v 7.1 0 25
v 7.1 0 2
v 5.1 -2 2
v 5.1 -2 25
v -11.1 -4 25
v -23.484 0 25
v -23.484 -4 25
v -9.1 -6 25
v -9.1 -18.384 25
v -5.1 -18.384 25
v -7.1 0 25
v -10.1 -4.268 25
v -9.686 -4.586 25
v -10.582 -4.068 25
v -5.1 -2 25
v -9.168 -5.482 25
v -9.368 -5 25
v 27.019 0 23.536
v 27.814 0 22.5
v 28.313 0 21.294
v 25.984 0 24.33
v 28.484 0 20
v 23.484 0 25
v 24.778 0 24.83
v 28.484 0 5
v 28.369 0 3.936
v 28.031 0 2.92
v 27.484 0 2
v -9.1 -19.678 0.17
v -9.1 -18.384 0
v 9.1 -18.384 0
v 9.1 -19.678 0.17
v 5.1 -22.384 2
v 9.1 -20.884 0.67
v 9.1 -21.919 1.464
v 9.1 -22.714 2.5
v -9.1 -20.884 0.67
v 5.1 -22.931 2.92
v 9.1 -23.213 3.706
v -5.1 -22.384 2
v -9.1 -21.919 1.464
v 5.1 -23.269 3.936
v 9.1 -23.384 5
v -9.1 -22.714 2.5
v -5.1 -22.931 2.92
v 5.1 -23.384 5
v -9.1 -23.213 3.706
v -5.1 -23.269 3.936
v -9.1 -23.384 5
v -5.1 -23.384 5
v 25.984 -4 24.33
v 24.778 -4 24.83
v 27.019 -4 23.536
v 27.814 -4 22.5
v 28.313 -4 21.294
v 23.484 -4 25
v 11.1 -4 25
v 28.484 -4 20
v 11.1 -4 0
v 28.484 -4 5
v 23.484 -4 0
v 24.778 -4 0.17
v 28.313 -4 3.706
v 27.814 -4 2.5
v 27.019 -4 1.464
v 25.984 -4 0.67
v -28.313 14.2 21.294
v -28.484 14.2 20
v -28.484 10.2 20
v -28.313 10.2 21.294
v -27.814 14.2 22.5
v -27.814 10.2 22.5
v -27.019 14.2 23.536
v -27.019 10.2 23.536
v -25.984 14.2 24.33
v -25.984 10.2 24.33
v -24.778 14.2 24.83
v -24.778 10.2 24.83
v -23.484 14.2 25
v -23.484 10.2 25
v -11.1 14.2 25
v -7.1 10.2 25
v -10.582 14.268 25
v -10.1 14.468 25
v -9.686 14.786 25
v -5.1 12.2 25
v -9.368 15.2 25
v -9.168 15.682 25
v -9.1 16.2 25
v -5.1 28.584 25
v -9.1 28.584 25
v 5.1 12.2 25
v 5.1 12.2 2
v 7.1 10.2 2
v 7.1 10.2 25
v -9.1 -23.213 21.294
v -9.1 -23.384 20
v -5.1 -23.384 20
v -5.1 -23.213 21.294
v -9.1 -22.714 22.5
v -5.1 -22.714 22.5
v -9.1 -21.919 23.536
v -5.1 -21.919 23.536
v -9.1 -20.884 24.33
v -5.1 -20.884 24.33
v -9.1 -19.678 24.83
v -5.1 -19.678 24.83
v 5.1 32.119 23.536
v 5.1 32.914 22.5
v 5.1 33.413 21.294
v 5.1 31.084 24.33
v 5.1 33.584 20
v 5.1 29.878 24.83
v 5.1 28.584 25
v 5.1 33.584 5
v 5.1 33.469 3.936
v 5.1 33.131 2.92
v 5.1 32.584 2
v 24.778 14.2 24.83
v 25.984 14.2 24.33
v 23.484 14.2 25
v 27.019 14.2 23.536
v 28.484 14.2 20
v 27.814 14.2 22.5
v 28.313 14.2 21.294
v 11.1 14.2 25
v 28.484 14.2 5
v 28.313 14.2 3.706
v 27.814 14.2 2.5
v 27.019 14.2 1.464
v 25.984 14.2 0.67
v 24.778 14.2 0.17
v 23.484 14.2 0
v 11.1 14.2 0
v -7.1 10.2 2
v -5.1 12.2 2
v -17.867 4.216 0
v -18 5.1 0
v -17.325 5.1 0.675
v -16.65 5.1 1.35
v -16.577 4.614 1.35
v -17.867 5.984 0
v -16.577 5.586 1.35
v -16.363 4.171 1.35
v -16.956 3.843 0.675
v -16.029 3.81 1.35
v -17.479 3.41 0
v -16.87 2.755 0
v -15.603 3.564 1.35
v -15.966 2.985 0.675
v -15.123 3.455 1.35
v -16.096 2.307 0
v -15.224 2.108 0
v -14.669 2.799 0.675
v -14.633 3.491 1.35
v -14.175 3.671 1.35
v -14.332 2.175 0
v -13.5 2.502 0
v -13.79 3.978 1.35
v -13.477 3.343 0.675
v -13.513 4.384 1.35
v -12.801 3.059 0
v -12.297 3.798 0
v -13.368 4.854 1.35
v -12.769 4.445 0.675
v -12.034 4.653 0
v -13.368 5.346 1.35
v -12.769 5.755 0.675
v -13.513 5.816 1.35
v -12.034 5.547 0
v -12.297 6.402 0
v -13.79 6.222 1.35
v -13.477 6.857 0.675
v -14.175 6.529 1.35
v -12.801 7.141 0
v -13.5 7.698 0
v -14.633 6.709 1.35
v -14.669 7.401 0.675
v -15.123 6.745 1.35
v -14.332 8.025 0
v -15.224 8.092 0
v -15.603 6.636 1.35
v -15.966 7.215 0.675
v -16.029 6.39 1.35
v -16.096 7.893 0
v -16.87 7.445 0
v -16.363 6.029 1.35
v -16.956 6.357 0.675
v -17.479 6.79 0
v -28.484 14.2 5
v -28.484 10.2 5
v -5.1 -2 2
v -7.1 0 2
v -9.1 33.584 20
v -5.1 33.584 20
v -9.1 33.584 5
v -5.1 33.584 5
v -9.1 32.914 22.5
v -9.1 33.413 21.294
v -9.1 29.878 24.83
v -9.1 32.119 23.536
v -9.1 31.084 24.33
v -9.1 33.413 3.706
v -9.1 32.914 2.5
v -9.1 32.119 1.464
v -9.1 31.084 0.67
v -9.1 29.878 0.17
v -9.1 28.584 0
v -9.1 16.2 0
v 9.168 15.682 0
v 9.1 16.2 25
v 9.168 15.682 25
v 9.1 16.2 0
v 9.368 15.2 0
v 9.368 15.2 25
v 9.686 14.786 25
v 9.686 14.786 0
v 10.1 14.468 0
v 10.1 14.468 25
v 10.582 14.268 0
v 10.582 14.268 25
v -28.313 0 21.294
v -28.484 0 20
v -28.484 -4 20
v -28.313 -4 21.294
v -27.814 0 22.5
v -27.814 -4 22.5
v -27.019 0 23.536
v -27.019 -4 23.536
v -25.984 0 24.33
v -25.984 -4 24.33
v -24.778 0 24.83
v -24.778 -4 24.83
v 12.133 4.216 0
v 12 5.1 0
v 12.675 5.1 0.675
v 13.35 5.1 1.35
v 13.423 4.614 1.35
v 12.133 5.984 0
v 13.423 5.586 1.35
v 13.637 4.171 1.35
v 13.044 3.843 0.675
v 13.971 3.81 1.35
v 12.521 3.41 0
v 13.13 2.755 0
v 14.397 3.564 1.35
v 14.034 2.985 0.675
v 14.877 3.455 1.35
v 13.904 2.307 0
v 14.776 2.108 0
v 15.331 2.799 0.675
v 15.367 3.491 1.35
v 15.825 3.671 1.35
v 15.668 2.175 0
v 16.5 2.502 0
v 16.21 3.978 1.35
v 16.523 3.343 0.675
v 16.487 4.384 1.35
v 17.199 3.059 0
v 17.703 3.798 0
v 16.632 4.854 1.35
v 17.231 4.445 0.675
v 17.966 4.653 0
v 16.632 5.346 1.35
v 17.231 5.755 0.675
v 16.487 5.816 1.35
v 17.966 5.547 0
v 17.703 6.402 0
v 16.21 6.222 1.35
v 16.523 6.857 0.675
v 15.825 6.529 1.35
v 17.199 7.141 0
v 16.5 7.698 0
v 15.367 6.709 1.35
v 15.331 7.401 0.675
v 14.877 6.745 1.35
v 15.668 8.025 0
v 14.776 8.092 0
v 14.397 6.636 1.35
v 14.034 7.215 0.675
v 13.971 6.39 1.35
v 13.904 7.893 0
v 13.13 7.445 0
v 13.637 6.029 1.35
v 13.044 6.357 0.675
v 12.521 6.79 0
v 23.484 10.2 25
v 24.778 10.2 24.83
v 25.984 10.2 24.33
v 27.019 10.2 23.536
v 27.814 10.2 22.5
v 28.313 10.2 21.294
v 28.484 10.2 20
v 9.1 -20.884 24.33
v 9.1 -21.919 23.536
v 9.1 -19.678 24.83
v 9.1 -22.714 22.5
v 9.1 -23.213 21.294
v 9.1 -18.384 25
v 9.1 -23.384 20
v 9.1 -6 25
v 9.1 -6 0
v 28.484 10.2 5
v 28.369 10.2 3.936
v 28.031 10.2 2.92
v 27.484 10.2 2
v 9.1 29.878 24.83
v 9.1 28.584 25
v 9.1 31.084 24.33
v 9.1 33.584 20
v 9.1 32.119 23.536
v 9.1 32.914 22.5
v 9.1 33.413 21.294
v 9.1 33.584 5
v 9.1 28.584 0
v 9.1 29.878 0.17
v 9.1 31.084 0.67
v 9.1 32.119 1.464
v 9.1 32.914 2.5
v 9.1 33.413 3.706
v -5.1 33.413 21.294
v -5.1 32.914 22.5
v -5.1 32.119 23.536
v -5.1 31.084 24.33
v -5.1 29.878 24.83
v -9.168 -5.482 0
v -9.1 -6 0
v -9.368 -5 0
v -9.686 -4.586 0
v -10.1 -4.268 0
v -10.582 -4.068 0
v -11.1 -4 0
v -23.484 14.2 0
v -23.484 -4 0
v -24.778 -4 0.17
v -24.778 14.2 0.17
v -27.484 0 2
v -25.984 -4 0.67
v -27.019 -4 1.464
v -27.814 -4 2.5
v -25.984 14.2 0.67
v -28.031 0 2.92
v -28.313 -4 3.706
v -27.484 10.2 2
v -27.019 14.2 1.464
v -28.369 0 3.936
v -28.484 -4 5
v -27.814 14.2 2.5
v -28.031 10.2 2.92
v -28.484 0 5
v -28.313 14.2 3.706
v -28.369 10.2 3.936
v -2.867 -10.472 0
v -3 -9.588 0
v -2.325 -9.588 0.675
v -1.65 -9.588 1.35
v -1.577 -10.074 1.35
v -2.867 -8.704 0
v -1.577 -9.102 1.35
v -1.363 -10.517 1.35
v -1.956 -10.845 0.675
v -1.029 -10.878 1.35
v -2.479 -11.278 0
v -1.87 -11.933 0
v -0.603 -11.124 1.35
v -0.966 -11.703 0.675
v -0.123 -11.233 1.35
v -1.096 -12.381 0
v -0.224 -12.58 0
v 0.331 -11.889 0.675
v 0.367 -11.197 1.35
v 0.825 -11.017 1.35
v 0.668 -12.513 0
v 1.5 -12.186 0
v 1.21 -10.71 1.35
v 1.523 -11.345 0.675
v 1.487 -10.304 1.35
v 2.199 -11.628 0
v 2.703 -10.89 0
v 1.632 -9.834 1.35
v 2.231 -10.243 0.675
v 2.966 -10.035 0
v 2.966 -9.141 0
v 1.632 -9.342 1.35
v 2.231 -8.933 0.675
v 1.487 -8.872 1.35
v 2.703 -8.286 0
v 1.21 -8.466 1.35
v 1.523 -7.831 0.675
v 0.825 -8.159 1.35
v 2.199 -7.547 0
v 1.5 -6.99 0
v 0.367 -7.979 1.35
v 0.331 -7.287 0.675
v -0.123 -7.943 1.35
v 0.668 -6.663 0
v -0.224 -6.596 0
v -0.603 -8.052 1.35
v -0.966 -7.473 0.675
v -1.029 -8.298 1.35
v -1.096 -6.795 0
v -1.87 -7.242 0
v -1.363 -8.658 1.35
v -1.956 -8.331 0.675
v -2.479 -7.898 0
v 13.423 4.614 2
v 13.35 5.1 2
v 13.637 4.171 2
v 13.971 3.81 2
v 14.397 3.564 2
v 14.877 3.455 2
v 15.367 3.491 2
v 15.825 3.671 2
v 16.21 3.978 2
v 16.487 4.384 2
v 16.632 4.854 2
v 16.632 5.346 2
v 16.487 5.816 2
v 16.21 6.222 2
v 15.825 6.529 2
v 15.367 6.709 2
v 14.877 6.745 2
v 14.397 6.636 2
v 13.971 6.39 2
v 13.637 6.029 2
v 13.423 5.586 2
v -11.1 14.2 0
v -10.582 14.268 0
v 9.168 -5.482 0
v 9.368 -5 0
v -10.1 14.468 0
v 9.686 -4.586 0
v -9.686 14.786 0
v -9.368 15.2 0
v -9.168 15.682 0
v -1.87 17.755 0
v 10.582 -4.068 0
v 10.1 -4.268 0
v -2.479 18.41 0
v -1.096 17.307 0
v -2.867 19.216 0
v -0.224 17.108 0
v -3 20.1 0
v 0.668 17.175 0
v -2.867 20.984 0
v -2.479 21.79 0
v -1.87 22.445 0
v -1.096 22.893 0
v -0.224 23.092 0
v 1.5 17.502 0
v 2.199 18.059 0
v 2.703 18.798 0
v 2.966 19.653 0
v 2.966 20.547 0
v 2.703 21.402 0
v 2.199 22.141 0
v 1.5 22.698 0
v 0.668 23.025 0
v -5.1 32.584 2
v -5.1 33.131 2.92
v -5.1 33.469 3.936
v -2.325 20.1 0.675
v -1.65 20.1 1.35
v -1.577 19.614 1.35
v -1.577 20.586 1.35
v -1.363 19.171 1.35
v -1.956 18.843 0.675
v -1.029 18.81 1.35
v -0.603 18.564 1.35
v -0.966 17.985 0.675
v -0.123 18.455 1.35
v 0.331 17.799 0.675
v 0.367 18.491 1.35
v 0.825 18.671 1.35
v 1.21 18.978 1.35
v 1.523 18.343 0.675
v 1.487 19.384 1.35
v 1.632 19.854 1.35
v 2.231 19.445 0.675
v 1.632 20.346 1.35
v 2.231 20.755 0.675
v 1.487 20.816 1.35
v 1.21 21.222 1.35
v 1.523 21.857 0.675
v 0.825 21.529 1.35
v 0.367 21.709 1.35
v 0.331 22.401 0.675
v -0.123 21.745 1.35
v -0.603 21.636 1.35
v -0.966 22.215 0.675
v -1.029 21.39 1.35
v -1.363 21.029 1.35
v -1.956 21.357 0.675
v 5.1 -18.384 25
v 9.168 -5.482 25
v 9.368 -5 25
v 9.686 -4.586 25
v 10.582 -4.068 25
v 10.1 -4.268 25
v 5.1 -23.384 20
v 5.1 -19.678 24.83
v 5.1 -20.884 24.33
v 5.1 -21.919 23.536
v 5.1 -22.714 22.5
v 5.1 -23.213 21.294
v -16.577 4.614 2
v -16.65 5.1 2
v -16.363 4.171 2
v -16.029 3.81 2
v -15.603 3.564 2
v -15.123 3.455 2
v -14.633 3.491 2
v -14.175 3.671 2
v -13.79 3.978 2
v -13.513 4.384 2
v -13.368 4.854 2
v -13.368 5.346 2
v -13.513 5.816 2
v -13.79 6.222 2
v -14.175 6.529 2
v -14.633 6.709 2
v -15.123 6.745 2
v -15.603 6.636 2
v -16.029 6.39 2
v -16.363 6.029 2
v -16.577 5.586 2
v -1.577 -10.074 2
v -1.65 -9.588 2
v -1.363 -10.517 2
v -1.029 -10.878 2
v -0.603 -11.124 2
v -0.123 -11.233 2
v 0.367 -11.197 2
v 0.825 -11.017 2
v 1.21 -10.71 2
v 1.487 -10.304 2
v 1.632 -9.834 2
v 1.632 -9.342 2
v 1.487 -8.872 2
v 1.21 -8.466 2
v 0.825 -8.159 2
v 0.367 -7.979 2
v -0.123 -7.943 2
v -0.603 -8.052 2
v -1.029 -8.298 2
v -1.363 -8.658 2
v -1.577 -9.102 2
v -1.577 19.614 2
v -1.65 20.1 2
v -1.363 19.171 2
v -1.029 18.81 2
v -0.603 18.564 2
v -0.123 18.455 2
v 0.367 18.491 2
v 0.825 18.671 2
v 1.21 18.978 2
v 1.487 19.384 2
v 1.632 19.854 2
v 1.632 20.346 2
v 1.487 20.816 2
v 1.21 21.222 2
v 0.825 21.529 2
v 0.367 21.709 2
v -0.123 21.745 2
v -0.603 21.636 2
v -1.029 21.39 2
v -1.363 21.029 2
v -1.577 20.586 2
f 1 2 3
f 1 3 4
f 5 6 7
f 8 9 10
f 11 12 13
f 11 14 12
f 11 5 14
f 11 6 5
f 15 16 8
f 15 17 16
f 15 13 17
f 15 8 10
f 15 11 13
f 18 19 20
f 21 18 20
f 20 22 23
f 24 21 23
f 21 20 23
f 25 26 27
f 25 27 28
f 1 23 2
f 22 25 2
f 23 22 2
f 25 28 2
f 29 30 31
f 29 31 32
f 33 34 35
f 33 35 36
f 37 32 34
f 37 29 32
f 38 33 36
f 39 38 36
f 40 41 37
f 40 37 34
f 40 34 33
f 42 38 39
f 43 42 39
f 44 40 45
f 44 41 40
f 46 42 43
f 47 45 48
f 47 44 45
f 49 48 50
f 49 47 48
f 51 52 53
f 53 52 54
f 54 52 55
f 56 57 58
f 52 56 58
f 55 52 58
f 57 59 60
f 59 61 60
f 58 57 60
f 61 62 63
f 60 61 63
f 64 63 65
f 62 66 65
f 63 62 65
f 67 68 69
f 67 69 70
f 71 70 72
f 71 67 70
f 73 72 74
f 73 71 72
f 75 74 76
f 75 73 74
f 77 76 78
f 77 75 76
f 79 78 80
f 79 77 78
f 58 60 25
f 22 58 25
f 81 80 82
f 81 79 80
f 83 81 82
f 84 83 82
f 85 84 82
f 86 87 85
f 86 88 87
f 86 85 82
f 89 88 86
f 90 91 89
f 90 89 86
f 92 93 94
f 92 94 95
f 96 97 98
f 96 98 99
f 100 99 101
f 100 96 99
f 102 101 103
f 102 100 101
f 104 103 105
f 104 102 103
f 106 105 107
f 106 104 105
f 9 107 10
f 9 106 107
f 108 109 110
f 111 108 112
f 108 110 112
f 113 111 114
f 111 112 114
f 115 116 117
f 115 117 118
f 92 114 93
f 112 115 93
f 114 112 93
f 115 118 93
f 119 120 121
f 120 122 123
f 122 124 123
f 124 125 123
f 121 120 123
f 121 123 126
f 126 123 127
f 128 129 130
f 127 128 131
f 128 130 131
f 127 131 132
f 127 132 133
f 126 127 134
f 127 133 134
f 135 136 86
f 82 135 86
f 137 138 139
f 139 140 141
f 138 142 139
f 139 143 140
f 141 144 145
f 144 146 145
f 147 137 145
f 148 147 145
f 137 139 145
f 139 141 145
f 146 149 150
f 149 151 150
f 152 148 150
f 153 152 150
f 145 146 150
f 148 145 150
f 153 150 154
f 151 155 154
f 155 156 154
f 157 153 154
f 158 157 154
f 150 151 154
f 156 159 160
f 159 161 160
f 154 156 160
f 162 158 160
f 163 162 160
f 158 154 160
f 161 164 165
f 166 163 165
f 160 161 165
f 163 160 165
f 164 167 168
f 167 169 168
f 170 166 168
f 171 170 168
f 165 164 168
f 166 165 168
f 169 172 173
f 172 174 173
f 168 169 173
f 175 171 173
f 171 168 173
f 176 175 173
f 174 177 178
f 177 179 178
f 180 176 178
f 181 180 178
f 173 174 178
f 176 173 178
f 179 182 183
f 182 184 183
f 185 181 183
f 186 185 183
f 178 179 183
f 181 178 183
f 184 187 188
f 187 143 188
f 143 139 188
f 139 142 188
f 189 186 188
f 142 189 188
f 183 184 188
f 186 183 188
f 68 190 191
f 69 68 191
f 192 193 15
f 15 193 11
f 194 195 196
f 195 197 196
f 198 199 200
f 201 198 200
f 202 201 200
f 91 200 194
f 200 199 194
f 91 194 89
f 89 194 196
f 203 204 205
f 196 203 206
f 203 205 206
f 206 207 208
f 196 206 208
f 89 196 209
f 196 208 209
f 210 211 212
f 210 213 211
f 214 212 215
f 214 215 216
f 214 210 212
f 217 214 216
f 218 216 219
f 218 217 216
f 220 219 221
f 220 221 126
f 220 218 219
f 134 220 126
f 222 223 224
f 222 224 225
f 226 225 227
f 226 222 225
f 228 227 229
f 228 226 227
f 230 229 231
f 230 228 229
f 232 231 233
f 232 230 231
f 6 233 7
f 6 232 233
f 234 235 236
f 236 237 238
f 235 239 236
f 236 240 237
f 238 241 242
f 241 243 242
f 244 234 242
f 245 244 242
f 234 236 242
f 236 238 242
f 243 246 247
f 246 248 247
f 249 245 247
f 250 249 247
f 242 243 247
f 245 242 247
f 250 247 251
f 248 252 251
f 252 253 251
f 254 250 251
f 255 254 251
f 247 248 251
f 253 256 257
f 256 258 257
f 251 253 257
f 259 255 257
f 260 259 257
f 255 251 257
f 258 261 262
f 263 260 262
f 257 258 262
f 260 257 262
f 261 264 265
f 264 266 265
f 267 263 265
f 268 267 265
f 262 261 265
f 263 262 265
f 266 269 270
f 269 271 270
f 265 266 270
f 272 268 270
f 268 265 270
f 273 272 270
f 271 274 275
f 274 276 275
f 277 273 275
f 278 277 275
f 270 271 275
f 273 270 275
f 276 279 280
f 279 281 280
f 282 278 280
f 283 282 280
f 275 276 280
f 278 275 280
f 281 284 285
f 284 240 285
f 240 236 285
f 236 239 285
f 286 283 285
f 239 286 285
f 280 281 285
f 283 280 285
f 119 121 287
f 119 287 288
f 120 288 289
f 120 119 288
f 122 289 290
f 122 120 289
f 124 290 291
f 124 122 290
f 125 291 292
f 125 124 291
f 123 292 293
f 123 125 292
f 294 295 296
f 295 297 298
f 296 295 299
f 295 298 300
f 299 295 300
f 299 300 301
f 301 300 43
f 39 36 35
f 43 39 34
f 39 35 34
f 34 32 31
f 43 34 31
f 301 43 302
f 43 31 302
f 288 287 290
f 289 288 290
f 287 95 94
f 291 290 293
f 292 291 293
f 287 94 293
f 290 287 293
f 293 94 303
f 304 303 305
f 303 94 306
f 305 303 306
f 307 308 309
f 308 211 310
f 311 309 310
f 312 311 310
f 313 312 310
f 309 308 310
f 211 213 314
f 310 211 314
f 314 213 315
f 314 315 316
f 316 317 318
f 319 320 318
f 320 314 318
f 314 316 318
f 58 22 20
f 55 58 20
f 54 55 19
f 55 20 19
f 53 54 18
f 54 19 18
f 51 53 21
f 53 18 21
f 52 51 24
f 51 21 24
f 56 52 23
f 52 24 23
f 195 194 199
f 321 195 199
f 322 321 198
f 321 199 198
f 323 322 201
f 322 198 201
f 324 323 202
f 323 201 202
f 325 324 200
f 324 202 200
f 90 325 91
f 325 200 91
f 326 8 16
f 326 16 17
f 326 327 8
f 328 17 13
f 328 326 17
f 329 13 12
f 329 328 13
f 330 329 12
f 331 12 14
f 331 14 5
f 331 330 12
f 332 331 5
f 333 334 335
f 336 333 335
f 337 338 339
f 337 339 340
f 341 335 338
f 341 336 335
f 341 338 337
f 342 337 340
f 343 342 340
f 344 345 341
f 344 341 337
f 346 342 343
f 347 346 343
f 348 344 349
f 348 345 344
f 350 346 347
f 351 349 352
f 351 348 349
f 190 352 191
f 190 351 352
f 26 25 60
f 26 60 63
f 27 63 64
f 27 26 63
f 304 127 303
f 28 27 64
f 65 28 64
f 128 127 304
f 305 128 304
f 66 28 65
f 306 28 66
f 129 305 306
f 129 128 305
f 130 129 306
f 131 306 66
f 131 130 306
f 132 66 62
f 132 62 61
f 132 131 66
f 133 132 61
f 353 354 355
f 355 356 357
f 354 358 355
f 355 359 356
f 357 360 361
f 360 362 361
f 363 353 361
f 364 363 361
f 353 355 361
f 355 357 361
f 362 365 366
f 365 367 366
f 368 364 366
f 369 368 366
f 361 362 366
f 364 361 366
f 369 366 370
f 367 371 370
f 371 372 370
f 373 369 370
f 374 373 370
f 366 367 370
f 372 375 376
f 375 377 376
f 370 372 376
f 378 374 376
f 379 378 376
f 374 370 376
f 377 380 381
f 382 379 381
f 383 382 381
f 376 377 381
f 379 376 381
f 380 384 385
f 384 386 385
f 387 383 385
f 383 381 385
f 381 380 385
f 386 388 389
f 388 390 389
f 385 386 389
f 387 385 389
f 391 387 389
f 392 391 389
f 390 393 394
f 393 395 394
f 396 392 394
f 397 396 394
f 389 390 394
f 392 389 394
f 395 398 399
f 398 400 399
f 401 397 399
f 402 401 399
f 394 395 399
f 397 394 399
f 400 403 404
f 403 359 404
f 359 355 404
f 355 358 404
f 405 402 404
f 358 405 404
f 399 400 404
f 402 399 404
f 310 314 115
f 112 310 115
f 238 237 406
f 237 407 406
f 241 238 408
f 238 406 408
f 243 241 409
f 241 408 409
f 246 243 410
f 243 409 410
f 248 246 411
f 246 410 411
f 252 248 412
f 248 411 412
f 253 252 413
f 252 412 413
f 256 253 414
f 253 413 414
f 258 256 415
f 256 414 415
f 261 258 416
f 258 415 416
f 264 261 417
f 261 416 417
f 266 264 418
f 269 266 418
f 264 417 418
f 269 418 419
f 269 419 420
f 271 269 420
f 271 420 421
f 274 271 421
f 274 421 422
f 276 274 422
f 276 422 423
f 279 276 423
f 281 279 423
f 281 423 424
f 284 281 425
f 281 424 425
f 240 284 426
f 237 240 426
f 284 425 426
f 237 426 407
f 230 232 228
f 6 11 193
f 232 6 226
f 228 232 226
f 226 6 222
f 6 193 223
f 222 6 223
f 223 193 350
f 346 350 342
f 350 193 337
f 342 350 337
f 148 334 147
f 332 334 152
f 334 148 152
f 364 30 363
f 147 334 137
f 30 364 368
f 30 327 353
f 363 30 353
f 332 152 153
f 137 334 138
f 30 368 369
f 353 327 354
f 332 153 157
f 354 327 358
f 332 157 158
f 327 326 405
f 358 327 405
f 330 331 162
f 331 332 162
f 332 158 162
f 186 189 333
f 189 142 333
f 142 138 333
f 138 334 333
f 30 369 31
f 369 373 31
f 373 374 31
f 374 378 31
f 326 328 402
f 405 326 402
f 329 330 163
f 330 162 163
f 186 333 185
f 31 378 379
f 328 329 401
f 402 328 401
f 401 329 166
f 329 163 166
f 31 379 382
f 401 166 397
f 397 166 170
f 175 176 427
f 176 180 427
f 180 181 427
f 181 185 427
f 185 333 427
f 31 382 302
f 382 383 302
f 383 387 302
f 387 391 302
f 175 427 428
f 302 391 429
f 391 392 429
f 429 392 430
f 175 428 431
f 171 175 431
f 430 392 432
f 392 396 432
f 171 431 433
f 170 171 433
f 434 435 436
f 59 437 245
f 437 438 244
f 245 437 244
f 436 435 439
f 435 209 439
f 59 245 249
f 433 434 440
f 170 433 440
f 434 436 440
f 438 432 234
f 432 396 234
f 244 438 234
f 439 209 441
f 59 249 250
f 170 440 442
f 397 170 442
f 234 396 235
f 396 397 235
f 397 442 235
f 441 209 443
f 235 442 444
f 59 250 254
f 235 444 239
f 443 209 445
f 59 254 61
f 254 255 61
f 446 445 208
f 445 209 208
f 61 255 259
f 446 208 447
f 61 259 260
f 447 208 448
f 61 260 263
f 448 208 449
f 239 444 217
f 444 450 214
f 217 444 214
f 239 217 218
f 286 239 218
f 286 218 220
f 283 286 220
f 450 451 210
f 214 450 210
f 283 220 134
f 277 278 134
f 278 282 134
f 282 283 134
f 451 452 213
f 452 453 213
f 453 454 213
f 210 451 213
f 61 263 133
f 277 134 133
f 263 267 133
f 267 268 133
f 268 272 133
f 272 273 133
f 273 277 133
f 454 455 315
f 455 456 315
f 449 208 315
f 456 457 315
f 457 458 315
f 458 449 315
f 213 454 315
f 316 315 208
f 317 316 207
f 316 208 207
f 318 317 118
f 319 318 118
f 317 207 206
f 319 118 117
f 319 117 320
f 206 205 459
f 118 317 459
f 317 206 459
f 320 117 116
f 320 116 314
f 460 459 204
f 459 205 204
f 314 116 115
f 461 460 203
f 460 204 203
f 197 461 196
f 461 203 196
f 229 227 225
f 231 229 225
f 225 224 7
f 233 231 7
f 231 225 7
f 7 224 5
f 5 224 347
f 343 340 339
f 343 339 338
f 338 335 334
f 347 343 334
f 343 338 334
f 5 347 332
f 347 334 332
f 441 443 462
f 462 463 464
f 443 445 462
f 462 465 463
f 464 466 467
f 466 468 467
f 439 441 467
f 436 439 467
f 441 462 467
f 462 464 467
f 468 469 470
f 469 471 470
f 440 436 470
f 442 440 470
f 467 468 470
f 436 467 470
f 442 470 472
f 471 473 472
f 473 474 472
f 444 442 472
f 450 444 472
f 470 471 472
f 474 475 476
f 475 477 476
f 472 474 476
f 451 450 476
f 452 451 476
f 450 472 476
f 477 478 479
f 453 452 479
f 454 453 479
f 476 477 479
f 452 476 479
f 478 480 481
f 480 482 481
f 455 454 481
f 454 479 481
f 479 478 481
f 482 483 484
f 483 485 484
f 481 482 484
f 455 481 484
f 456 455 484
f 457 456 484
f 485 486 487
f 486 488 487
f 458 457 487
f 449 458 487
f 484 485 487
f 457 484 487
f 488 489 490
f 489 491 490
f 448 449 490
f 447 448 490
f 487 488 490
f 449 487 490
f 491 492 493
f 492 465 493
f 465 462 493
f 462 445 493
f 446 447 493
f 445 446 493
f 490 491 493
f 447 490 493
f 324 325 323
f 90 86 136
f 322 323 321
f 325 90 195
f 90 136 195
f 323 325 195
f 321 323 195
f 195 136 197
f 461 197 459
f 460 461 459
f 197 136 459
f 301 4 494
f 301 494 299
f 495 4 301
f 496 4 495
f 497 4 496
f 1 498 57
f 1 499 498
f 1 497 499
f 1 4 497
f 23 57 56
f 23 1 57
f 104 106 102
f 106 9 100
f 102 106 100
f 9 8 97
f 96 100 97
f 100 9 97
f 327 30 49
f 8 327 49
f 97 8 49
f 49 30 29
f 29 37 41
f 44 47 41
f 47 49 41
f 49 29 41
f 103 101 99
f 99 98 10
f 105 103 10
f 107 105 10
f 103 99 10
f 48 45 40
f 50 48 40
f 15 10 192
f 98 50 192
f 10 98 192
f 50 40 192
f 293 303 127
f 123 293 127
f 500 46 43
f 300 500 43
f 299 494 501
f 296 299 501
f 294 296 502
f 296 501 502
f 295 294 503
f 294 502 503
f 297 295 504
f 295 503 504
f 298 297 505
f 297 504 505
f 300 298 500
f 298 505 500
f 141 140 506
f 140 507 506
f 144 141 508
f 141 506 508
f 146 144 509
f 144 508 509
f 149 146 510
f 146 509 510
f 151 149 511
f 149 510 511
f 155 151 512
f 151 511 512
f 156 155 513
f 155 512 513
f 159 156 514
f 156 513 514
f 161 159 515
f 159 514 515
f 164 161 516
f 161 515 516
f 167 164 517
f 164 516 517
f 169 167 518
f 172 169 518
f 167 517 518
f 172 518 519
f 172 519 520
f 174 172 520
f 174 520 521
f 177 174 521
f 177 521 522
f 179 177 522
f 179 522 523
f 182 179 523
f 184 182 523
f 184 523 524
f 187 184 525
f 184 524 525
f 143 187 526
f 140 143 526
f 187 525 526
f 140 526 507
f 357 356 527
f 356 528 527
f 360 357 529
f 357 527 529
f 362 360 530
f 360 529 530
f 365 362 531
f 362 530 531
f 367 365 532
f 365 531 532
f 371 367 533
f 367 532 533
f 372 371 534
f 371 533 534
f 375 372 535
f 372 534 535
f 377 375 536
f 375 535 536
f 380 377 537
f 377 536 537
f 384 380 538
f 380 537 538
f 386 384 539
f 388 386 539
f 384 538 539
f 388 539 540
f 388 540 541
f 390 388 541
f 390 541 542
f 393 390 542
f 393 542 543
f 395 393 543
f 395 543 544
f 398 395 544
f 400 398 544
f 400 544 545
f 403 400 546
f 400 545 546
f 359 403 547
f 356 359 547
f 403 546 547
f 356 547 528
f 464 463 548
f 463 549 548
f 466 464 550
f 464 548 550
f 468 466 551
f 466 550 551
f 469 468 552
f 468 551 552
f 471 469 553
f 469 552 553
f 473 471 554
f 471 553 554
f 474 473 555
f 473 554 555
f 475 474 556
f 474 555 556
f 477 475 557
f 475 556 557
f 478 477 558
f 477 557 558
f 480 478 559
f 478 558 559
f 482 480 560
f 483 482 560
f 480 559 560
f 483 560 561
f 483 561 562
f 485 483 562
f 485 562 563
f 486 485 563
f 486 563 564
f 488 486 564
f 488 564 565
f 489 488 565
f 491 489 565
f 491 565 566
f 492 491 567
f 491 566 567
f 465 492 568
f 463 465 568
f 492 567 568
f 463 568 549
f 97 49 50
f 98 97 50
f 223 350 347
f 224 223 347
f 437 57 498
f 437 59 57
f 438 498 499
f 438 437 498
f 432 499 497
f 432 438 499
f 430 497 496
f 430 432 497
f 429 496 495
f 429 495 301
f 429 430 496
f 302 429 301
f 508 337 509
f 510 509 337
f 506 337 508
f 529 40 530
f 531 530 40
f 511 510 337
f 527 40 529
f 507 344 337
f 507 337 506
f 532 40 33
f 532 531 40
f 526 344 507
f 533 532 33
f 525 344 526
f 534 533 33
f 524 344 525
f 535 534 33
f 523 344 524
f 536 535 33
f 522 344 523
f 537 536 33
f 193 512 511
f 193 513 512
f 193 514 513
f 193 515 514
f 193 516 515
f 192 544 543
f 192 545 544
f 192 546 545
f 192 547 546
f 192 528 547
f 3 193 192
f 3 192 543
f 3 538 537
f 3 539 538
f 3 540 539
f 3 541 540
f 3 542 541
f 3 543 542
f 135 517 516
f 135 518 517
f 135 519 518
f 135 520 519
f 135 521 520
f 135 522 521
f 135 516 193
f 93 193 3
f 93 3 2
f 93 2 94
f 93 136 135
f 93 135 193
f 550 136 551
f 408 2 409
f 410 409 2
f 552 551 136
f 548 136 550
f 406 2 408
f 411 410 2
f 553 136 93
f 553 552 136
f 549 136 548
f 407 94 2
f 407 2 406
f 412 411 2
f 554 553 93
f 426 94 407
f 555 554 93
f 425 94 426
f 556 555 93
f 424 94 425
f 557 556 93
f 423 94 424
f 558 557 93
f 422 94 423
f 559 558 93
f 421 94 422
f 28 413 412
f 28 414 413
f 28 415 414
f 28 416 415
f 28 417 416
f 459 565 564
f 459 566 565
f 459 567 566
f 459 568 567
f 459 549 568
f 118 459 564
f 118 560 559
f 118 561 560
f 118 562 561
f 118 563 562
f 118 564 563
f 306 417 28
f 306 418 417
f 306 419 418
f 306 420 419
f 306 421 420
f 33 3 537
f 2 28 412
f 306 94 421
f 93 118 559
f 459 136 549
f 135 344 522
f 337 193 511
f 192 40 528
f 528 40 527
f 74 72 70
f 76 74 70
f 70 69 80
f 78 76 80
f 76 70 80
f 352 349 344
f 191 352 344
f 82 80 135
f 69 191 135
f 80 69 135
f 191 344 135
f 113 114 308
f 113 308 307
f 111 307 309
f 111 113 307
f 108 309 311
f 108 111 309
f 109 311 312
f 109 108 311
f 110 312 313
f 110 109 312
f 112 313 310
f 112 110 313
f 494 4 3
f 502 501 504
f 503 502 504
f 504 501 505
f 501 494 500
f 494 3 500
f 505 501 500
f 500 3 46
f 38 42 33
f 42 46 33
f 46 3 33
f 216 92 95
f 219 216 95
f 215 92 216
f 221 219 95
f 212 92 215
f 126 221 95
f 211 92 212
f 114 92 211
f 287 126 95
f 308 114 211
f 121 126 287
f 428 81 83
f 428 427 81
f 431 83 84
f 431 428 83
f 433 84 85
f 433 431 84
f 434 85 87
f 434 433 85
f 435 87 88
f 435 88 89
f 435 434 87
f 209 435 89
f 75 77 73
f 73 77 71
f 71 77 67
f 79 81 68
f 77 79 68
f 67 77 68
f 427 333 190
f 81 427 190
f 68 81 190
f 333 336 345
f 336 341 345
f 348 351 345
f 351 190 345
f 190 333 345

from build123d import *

# Parameters (mm, degrees)
F1_DEPTH       = 2
F2_DEPTH       = 25
F3_R           = 2
F4_T1_DEPTH    = 4
F4_T3_DEPTH    = 4
F4_T5_DEPTH    = 4
F4_T7_DEPTH    = 18.2
F4_T9_DEPTH    = 18.2
F4_T11_DEPTH   = 4
F5_R           = 2
F6_SIZE        = 2
F8_D           = 3.3
F8_CSINK_D     = 6
F8_CSINK_ANGLE = 90


# Not quite as in the source:
# - a fillet or chamfer that OpenCascade refuses, or shapes differently, is made with other operations: its cross-section is extruded or revolved along the edge and cut away or added
# - a feature names something its author has since deleted; it is built from what else it names


with BuildPart() as f1:
    # F0 (on Top) → F1 (new body)
    with BuildSketch(Plane.XY):
        Polygon((28.4836267311, 0), (28.4836267311, 10.2), (5.1, 10.2), (5.1, 33.5836267311), (-5.1, 33.5836267311), (-5.1, 10.2), (-28.4836267311, 10.2), (-28.4836267311, 0), (-5.1, 0), (-5.1, -23.3836267311), (5.1, -23.3836267311), (5.1, 0), align=None)
        Polygon((5.1, 10.2), (28.4836267311, 10.2), (28.4836267311, 14.2), (9.1, 14.2), (9.1, 33.5836267311), (5.1, 33.5836267311), align=None)
        Polygon((28.4836267311, -4), (28.4836267311, 0), (5.1, 0), (5.1, -23.3836267311), (9.1, -23.3836267311), (9.1, -4), align=None)
        Polygon((-5.1, 10.2), (-5.1, 33.5836267311), (-9.1, 33.5836267311), (-9.1, 14.2), (-28.4836267311, 14.2), (-28.4836267311, 10.2), align=None)
        Polygon((-9.1, -23.3836267311), (-5.1, -23.3836267311), (-5.1, 0), (-28.4836267311, 0), (-28.4836267311, -4), (-9.1, -4), align=None)
    extrude(amount=F1_DEPTH)

    # F0 (on Top) → F2 (join)
    with BuildSketch(Plane.XY):
        Polygon((-5.1, 10.2), (-5.1, 33.5836267311), (-9.1, 33.5836267311), (-9.1, 14.2), (-28.4836267311, 14.2), (-28.4836267311, 10.2), align=None)
        Polygon((5.1, 10.2), (28.4836267311, 10.2), (28.4836267311, 14.2), (9.1, 14.2), (9.1, 33.5836267311), (5.1, 33.5836267311), align=None)
        Polygon((-9.1, -23.3836267311), (-5.1, -23.3836267311), (-5.1, 0), (-28.4836267311, 0), (-28.4836267311, -4), (-9.1, -4), align=None)
        Polygon((28.4836267311, -4), (28.4836267311, 0), (5.1, 0), (5.1, -23.3836267311), (9.1, -23.3836267311), (9.1, -4), align=None)
    extrude(amount=F2_DEPTH)

    # F3
    f3_edges = [f1.edges().sort_by_distance(p)[0] for p in [
        (9.1, 14.2, 12.5),
        (9.1, -4, 12.5),
    ]]
    fillet(f3_edges, radius=F3_R)

    # F4: fillet of radius 5 on 12 edges, made by hand

    # F4_s2 → F4_t1 (cut)
    with BuildSketch(Plane.XZ.offset(-14.2)):
        with BuildLine():
            ThreePointArc((23.4836267311, 25), (27.0191606371, 23.5355339059), (28.4836267311, 20))
            Line((28.4836267311, 20), (28.5836267311, 20))
            Line((28.5836267311, 20), (28.5836267311, 25.1))
            Line((28.5836267311, 25.1), (23.4836267311, 25.1))
            Line((23.4836267311, 25.1), (23.4836267311, 25))
        make_face()
        with BuildLine():
            ThreePointArc((-28.4836267311, 20), (-27.0191606371, 23.5355339059), (-23.4836267311, 25))
            Line((-23.4836267311, 25), (-23.4836267311, 25.1))
            Line((-23.4836267311, 25.1), (-28.5836267311, 25.1))
            Line((-28.5836267311, 25.1), (-28.5836267311, 20))
            Line((-28.5836267311, 20), (-28.4836267311, 20))
        make_face()
    extrude(amount=F4_T1_DEPTH, mode=Mode.SUBTRACT)

    # F4_s4 → F4_t3 (cut)
    with BuildSketch(Plane.YZ.offset(-9.1)):
        with BuildLine():
            ThreePointArc((33.5836267311, 20), (32.1191606371, 23.5355339059), (28.5836267311, 25))
            Line((28.5836267311, 25), (28.5836267311, 25.1))
            Line((28.5836267311, 25.1), (33.6836267311, 25.1))
            Line((33.6836267311, 25.1), (33.6836267311, 20))
            Line((33.6836267311, 20), (33.5836267311, 20))
        make_face()
        with BuildLine():
            ThreePointArc((-23.3836267311, 20), (-21.9191606371, 23.5355339059), (-18.3836267311, 25))
            Line((-18.3836267311, 25), (-18.3836267311, 25.1))
            Line((-18.3836267311, 25.1), (-23.4836267311, 25.1))
            Line((-23.4836267311, 25.1), (-23.4836267311, 20))
            Line((-23.4836267311, 20), (-23.3836267311, 20))
        make_face()
    extrude(amount=F4_T3_DEPTH, mode=Mode.SUBTRACT)

    # F4_s6 → F4_t5 (cut)
    with BuildSketch(Plane.YZ.offset(5.1)):
        with BuildLine():
            ThreePointArc((28.5836267311, 25), (32.1191606371, 23.5355339059), (33.5836267311, 20))
            Line((33.5836267311, 20), (33.6836267311, 20))
            Line((33.6836267311, 20), (33.6836267311, 25.1))
            Line((33.6836267311, 25.1), (28.5836267311, 25.1))
            Line((28.5836267311, 25.1), (28.5836267311, 25))
        make_face()
        with BuildLine():
            ThreePointArc((-18.3836267311, 25), (-21.9191606371, 23.5355339059), (-23.3836267311, 20))
            Line((-23.3836267311, 20), (-23.4836267311, 20))
            Line((-23.4836267311, 20), (-23.4836267311, 25.1))
            Line((-23.4836267311, 25.1), (-18.3836267311, 25.1))
            Line((-18.3836267311, 25.1), (-18.3836267311, 25))
        make_face()
    extrude(amount=F4_T5_DEPTH, mode=Mode.SUBTRACT)

    # F4_s8 → F4_t7 (cut)
    with BuildSketch(Plane.XZ.offset(-14.2)):
        with BuildLine():
            ThreePointArc((-23.4836267311, 0), (-27.0191606371, 1.4644660941), (-28.4836267311, 5))
            Line((-28.4836267311, 5), (-28.5836267311, 5))
            Line((-28.5836267311, 5), (-28.5836267311, -0.1))
            Line((-28.5836267311, -0.1), (-23.4836267311, -0.1))
            Line((-23.4836267311, -0.1), (-23.4836267311, 0))
        make_face()
        with BuildLine():
            ThreePointArc((28.4836267311, 5), (27.0191606371, 1.4644660941), (23.4836267311, 0))
            Line((23.4836267311, 0), (23.4836267311, -0.1))
            Line((23.4836267311, -0.1), (28.5836267311, -0.1))
            Line((28.5836267311, -0.1), (28.5836267311, 5))
            Line((28.5836267311, 5), (28.4836267311, 5))
        make_face()
    extrude(amount=F4_T7_DEPTH, mode=Mode.SUBTRACT)

    # F4_s10 → F4_t9 (cut)
    with BuildSketch(Plane.YZ.offset(-9.1)):
        with BuildLine():
            ThreePointArc((28.5836267311, 0), (32.1191606371, 1.4644660941), (33.5836267311, 5))
            Line((33.5836267311, 5), (33.6836267311, 5))
            Line((33.6836267311, 5), (33.6836267311, -0.1))
            Line((33.6836267311, -0.1), (28.5836267311, -0.1))
            Line((28.5836267311, -0.1), (28.5836267311, 0))
        make_face()
        with BuildLine():
            ThreePointArc((-18.3836267311, 0), (-21.9191606371, 1.4644660941), (-23.3836267311, 5))
            Line((-23.3836267311, 5), (-23.4836267311, 5))
            Line((-23.4836267311, 5), (-23.4836267311, -0.1))
            Line((-23.4836267311, -0.1), (-18.3836267311, -0.1))
            Line((-18.3836267311, -0.1), (-18.3836267311, 0))
        make_face()
    extrude(amount=F4_T9_DEPTH, mode=Mode.SUBTRACT)

    # F4_s12 → F4_t11 (cut)
    with BuildSketch(Plane.XZ):
        with BuildLine():
            ThreePointArc((28.4836267311, 20), (27.0191606371, 23.5355339059), (23.4836267311, 25))
            Line((23.4836267311, 25), (23.4836267311, 25.1))
            Line((23.4836267311, 25.1), (28.5836267311, 25.1))
            Line((28.5836267311, 25.1), (28.5836267311, 20))
            Line((28.5836267311, 20), (28.4836267311, 20))
        make_face()
        with BuildLine():
            ThreePointArc((-28.4836267311, 20), (-27.0191606371, 23.5355339059), (-23.4836267311, 25))
            Line((-23.4836267311, 25), (-23.4836267311, 25.1))
            Line((-23.4836267311, 25.1), (-28.5836267311, 25.1))
            Line((-28.5836267311, 25.1), (-28.5836267311, 20))
            Line((-28.5836267311, 20), (-28.4836267311, 20))
        make_face()
    extrude(amount=F4_T11_DEPTH, mode=Mode.SUBTRACT)

    # F5
    f5_edges = [f1.edges().sort_by_distance(p)[0] for p in [
        (-9.1, 14.2, 12.5),
        (-9.1, -4, 12.5),
    ]]
    fillet(f5_edges, radius=F5_R)

    # F6
    f6_edges = [f1.edges().sort_by_distance(p)[0] for p in [
        (5.1, 10.2, 13.5),
        (-5.1, 10.2, 13.5),
        (5.1, 0, 13.5),
        (-5.1, 0, 13.5),
    ]]
    chamfer(f6_edges, length=F6_SIZE)

    # F8 (through all)
    with Locations(Plane(origin=(0, 0, 0), x_dir=(1, 0, 0), z_dir=(0, 0, -1))):
        with Locations((0, 9.587961331), (-15, -5.1), (15, -5.1), (0, -20.1)):
            CounterSinkHole(F8_D / 2, F8_CSINK_D / 2, counter_sink_angle=F8_CSINK_ANGLE)


solid = f1.part
